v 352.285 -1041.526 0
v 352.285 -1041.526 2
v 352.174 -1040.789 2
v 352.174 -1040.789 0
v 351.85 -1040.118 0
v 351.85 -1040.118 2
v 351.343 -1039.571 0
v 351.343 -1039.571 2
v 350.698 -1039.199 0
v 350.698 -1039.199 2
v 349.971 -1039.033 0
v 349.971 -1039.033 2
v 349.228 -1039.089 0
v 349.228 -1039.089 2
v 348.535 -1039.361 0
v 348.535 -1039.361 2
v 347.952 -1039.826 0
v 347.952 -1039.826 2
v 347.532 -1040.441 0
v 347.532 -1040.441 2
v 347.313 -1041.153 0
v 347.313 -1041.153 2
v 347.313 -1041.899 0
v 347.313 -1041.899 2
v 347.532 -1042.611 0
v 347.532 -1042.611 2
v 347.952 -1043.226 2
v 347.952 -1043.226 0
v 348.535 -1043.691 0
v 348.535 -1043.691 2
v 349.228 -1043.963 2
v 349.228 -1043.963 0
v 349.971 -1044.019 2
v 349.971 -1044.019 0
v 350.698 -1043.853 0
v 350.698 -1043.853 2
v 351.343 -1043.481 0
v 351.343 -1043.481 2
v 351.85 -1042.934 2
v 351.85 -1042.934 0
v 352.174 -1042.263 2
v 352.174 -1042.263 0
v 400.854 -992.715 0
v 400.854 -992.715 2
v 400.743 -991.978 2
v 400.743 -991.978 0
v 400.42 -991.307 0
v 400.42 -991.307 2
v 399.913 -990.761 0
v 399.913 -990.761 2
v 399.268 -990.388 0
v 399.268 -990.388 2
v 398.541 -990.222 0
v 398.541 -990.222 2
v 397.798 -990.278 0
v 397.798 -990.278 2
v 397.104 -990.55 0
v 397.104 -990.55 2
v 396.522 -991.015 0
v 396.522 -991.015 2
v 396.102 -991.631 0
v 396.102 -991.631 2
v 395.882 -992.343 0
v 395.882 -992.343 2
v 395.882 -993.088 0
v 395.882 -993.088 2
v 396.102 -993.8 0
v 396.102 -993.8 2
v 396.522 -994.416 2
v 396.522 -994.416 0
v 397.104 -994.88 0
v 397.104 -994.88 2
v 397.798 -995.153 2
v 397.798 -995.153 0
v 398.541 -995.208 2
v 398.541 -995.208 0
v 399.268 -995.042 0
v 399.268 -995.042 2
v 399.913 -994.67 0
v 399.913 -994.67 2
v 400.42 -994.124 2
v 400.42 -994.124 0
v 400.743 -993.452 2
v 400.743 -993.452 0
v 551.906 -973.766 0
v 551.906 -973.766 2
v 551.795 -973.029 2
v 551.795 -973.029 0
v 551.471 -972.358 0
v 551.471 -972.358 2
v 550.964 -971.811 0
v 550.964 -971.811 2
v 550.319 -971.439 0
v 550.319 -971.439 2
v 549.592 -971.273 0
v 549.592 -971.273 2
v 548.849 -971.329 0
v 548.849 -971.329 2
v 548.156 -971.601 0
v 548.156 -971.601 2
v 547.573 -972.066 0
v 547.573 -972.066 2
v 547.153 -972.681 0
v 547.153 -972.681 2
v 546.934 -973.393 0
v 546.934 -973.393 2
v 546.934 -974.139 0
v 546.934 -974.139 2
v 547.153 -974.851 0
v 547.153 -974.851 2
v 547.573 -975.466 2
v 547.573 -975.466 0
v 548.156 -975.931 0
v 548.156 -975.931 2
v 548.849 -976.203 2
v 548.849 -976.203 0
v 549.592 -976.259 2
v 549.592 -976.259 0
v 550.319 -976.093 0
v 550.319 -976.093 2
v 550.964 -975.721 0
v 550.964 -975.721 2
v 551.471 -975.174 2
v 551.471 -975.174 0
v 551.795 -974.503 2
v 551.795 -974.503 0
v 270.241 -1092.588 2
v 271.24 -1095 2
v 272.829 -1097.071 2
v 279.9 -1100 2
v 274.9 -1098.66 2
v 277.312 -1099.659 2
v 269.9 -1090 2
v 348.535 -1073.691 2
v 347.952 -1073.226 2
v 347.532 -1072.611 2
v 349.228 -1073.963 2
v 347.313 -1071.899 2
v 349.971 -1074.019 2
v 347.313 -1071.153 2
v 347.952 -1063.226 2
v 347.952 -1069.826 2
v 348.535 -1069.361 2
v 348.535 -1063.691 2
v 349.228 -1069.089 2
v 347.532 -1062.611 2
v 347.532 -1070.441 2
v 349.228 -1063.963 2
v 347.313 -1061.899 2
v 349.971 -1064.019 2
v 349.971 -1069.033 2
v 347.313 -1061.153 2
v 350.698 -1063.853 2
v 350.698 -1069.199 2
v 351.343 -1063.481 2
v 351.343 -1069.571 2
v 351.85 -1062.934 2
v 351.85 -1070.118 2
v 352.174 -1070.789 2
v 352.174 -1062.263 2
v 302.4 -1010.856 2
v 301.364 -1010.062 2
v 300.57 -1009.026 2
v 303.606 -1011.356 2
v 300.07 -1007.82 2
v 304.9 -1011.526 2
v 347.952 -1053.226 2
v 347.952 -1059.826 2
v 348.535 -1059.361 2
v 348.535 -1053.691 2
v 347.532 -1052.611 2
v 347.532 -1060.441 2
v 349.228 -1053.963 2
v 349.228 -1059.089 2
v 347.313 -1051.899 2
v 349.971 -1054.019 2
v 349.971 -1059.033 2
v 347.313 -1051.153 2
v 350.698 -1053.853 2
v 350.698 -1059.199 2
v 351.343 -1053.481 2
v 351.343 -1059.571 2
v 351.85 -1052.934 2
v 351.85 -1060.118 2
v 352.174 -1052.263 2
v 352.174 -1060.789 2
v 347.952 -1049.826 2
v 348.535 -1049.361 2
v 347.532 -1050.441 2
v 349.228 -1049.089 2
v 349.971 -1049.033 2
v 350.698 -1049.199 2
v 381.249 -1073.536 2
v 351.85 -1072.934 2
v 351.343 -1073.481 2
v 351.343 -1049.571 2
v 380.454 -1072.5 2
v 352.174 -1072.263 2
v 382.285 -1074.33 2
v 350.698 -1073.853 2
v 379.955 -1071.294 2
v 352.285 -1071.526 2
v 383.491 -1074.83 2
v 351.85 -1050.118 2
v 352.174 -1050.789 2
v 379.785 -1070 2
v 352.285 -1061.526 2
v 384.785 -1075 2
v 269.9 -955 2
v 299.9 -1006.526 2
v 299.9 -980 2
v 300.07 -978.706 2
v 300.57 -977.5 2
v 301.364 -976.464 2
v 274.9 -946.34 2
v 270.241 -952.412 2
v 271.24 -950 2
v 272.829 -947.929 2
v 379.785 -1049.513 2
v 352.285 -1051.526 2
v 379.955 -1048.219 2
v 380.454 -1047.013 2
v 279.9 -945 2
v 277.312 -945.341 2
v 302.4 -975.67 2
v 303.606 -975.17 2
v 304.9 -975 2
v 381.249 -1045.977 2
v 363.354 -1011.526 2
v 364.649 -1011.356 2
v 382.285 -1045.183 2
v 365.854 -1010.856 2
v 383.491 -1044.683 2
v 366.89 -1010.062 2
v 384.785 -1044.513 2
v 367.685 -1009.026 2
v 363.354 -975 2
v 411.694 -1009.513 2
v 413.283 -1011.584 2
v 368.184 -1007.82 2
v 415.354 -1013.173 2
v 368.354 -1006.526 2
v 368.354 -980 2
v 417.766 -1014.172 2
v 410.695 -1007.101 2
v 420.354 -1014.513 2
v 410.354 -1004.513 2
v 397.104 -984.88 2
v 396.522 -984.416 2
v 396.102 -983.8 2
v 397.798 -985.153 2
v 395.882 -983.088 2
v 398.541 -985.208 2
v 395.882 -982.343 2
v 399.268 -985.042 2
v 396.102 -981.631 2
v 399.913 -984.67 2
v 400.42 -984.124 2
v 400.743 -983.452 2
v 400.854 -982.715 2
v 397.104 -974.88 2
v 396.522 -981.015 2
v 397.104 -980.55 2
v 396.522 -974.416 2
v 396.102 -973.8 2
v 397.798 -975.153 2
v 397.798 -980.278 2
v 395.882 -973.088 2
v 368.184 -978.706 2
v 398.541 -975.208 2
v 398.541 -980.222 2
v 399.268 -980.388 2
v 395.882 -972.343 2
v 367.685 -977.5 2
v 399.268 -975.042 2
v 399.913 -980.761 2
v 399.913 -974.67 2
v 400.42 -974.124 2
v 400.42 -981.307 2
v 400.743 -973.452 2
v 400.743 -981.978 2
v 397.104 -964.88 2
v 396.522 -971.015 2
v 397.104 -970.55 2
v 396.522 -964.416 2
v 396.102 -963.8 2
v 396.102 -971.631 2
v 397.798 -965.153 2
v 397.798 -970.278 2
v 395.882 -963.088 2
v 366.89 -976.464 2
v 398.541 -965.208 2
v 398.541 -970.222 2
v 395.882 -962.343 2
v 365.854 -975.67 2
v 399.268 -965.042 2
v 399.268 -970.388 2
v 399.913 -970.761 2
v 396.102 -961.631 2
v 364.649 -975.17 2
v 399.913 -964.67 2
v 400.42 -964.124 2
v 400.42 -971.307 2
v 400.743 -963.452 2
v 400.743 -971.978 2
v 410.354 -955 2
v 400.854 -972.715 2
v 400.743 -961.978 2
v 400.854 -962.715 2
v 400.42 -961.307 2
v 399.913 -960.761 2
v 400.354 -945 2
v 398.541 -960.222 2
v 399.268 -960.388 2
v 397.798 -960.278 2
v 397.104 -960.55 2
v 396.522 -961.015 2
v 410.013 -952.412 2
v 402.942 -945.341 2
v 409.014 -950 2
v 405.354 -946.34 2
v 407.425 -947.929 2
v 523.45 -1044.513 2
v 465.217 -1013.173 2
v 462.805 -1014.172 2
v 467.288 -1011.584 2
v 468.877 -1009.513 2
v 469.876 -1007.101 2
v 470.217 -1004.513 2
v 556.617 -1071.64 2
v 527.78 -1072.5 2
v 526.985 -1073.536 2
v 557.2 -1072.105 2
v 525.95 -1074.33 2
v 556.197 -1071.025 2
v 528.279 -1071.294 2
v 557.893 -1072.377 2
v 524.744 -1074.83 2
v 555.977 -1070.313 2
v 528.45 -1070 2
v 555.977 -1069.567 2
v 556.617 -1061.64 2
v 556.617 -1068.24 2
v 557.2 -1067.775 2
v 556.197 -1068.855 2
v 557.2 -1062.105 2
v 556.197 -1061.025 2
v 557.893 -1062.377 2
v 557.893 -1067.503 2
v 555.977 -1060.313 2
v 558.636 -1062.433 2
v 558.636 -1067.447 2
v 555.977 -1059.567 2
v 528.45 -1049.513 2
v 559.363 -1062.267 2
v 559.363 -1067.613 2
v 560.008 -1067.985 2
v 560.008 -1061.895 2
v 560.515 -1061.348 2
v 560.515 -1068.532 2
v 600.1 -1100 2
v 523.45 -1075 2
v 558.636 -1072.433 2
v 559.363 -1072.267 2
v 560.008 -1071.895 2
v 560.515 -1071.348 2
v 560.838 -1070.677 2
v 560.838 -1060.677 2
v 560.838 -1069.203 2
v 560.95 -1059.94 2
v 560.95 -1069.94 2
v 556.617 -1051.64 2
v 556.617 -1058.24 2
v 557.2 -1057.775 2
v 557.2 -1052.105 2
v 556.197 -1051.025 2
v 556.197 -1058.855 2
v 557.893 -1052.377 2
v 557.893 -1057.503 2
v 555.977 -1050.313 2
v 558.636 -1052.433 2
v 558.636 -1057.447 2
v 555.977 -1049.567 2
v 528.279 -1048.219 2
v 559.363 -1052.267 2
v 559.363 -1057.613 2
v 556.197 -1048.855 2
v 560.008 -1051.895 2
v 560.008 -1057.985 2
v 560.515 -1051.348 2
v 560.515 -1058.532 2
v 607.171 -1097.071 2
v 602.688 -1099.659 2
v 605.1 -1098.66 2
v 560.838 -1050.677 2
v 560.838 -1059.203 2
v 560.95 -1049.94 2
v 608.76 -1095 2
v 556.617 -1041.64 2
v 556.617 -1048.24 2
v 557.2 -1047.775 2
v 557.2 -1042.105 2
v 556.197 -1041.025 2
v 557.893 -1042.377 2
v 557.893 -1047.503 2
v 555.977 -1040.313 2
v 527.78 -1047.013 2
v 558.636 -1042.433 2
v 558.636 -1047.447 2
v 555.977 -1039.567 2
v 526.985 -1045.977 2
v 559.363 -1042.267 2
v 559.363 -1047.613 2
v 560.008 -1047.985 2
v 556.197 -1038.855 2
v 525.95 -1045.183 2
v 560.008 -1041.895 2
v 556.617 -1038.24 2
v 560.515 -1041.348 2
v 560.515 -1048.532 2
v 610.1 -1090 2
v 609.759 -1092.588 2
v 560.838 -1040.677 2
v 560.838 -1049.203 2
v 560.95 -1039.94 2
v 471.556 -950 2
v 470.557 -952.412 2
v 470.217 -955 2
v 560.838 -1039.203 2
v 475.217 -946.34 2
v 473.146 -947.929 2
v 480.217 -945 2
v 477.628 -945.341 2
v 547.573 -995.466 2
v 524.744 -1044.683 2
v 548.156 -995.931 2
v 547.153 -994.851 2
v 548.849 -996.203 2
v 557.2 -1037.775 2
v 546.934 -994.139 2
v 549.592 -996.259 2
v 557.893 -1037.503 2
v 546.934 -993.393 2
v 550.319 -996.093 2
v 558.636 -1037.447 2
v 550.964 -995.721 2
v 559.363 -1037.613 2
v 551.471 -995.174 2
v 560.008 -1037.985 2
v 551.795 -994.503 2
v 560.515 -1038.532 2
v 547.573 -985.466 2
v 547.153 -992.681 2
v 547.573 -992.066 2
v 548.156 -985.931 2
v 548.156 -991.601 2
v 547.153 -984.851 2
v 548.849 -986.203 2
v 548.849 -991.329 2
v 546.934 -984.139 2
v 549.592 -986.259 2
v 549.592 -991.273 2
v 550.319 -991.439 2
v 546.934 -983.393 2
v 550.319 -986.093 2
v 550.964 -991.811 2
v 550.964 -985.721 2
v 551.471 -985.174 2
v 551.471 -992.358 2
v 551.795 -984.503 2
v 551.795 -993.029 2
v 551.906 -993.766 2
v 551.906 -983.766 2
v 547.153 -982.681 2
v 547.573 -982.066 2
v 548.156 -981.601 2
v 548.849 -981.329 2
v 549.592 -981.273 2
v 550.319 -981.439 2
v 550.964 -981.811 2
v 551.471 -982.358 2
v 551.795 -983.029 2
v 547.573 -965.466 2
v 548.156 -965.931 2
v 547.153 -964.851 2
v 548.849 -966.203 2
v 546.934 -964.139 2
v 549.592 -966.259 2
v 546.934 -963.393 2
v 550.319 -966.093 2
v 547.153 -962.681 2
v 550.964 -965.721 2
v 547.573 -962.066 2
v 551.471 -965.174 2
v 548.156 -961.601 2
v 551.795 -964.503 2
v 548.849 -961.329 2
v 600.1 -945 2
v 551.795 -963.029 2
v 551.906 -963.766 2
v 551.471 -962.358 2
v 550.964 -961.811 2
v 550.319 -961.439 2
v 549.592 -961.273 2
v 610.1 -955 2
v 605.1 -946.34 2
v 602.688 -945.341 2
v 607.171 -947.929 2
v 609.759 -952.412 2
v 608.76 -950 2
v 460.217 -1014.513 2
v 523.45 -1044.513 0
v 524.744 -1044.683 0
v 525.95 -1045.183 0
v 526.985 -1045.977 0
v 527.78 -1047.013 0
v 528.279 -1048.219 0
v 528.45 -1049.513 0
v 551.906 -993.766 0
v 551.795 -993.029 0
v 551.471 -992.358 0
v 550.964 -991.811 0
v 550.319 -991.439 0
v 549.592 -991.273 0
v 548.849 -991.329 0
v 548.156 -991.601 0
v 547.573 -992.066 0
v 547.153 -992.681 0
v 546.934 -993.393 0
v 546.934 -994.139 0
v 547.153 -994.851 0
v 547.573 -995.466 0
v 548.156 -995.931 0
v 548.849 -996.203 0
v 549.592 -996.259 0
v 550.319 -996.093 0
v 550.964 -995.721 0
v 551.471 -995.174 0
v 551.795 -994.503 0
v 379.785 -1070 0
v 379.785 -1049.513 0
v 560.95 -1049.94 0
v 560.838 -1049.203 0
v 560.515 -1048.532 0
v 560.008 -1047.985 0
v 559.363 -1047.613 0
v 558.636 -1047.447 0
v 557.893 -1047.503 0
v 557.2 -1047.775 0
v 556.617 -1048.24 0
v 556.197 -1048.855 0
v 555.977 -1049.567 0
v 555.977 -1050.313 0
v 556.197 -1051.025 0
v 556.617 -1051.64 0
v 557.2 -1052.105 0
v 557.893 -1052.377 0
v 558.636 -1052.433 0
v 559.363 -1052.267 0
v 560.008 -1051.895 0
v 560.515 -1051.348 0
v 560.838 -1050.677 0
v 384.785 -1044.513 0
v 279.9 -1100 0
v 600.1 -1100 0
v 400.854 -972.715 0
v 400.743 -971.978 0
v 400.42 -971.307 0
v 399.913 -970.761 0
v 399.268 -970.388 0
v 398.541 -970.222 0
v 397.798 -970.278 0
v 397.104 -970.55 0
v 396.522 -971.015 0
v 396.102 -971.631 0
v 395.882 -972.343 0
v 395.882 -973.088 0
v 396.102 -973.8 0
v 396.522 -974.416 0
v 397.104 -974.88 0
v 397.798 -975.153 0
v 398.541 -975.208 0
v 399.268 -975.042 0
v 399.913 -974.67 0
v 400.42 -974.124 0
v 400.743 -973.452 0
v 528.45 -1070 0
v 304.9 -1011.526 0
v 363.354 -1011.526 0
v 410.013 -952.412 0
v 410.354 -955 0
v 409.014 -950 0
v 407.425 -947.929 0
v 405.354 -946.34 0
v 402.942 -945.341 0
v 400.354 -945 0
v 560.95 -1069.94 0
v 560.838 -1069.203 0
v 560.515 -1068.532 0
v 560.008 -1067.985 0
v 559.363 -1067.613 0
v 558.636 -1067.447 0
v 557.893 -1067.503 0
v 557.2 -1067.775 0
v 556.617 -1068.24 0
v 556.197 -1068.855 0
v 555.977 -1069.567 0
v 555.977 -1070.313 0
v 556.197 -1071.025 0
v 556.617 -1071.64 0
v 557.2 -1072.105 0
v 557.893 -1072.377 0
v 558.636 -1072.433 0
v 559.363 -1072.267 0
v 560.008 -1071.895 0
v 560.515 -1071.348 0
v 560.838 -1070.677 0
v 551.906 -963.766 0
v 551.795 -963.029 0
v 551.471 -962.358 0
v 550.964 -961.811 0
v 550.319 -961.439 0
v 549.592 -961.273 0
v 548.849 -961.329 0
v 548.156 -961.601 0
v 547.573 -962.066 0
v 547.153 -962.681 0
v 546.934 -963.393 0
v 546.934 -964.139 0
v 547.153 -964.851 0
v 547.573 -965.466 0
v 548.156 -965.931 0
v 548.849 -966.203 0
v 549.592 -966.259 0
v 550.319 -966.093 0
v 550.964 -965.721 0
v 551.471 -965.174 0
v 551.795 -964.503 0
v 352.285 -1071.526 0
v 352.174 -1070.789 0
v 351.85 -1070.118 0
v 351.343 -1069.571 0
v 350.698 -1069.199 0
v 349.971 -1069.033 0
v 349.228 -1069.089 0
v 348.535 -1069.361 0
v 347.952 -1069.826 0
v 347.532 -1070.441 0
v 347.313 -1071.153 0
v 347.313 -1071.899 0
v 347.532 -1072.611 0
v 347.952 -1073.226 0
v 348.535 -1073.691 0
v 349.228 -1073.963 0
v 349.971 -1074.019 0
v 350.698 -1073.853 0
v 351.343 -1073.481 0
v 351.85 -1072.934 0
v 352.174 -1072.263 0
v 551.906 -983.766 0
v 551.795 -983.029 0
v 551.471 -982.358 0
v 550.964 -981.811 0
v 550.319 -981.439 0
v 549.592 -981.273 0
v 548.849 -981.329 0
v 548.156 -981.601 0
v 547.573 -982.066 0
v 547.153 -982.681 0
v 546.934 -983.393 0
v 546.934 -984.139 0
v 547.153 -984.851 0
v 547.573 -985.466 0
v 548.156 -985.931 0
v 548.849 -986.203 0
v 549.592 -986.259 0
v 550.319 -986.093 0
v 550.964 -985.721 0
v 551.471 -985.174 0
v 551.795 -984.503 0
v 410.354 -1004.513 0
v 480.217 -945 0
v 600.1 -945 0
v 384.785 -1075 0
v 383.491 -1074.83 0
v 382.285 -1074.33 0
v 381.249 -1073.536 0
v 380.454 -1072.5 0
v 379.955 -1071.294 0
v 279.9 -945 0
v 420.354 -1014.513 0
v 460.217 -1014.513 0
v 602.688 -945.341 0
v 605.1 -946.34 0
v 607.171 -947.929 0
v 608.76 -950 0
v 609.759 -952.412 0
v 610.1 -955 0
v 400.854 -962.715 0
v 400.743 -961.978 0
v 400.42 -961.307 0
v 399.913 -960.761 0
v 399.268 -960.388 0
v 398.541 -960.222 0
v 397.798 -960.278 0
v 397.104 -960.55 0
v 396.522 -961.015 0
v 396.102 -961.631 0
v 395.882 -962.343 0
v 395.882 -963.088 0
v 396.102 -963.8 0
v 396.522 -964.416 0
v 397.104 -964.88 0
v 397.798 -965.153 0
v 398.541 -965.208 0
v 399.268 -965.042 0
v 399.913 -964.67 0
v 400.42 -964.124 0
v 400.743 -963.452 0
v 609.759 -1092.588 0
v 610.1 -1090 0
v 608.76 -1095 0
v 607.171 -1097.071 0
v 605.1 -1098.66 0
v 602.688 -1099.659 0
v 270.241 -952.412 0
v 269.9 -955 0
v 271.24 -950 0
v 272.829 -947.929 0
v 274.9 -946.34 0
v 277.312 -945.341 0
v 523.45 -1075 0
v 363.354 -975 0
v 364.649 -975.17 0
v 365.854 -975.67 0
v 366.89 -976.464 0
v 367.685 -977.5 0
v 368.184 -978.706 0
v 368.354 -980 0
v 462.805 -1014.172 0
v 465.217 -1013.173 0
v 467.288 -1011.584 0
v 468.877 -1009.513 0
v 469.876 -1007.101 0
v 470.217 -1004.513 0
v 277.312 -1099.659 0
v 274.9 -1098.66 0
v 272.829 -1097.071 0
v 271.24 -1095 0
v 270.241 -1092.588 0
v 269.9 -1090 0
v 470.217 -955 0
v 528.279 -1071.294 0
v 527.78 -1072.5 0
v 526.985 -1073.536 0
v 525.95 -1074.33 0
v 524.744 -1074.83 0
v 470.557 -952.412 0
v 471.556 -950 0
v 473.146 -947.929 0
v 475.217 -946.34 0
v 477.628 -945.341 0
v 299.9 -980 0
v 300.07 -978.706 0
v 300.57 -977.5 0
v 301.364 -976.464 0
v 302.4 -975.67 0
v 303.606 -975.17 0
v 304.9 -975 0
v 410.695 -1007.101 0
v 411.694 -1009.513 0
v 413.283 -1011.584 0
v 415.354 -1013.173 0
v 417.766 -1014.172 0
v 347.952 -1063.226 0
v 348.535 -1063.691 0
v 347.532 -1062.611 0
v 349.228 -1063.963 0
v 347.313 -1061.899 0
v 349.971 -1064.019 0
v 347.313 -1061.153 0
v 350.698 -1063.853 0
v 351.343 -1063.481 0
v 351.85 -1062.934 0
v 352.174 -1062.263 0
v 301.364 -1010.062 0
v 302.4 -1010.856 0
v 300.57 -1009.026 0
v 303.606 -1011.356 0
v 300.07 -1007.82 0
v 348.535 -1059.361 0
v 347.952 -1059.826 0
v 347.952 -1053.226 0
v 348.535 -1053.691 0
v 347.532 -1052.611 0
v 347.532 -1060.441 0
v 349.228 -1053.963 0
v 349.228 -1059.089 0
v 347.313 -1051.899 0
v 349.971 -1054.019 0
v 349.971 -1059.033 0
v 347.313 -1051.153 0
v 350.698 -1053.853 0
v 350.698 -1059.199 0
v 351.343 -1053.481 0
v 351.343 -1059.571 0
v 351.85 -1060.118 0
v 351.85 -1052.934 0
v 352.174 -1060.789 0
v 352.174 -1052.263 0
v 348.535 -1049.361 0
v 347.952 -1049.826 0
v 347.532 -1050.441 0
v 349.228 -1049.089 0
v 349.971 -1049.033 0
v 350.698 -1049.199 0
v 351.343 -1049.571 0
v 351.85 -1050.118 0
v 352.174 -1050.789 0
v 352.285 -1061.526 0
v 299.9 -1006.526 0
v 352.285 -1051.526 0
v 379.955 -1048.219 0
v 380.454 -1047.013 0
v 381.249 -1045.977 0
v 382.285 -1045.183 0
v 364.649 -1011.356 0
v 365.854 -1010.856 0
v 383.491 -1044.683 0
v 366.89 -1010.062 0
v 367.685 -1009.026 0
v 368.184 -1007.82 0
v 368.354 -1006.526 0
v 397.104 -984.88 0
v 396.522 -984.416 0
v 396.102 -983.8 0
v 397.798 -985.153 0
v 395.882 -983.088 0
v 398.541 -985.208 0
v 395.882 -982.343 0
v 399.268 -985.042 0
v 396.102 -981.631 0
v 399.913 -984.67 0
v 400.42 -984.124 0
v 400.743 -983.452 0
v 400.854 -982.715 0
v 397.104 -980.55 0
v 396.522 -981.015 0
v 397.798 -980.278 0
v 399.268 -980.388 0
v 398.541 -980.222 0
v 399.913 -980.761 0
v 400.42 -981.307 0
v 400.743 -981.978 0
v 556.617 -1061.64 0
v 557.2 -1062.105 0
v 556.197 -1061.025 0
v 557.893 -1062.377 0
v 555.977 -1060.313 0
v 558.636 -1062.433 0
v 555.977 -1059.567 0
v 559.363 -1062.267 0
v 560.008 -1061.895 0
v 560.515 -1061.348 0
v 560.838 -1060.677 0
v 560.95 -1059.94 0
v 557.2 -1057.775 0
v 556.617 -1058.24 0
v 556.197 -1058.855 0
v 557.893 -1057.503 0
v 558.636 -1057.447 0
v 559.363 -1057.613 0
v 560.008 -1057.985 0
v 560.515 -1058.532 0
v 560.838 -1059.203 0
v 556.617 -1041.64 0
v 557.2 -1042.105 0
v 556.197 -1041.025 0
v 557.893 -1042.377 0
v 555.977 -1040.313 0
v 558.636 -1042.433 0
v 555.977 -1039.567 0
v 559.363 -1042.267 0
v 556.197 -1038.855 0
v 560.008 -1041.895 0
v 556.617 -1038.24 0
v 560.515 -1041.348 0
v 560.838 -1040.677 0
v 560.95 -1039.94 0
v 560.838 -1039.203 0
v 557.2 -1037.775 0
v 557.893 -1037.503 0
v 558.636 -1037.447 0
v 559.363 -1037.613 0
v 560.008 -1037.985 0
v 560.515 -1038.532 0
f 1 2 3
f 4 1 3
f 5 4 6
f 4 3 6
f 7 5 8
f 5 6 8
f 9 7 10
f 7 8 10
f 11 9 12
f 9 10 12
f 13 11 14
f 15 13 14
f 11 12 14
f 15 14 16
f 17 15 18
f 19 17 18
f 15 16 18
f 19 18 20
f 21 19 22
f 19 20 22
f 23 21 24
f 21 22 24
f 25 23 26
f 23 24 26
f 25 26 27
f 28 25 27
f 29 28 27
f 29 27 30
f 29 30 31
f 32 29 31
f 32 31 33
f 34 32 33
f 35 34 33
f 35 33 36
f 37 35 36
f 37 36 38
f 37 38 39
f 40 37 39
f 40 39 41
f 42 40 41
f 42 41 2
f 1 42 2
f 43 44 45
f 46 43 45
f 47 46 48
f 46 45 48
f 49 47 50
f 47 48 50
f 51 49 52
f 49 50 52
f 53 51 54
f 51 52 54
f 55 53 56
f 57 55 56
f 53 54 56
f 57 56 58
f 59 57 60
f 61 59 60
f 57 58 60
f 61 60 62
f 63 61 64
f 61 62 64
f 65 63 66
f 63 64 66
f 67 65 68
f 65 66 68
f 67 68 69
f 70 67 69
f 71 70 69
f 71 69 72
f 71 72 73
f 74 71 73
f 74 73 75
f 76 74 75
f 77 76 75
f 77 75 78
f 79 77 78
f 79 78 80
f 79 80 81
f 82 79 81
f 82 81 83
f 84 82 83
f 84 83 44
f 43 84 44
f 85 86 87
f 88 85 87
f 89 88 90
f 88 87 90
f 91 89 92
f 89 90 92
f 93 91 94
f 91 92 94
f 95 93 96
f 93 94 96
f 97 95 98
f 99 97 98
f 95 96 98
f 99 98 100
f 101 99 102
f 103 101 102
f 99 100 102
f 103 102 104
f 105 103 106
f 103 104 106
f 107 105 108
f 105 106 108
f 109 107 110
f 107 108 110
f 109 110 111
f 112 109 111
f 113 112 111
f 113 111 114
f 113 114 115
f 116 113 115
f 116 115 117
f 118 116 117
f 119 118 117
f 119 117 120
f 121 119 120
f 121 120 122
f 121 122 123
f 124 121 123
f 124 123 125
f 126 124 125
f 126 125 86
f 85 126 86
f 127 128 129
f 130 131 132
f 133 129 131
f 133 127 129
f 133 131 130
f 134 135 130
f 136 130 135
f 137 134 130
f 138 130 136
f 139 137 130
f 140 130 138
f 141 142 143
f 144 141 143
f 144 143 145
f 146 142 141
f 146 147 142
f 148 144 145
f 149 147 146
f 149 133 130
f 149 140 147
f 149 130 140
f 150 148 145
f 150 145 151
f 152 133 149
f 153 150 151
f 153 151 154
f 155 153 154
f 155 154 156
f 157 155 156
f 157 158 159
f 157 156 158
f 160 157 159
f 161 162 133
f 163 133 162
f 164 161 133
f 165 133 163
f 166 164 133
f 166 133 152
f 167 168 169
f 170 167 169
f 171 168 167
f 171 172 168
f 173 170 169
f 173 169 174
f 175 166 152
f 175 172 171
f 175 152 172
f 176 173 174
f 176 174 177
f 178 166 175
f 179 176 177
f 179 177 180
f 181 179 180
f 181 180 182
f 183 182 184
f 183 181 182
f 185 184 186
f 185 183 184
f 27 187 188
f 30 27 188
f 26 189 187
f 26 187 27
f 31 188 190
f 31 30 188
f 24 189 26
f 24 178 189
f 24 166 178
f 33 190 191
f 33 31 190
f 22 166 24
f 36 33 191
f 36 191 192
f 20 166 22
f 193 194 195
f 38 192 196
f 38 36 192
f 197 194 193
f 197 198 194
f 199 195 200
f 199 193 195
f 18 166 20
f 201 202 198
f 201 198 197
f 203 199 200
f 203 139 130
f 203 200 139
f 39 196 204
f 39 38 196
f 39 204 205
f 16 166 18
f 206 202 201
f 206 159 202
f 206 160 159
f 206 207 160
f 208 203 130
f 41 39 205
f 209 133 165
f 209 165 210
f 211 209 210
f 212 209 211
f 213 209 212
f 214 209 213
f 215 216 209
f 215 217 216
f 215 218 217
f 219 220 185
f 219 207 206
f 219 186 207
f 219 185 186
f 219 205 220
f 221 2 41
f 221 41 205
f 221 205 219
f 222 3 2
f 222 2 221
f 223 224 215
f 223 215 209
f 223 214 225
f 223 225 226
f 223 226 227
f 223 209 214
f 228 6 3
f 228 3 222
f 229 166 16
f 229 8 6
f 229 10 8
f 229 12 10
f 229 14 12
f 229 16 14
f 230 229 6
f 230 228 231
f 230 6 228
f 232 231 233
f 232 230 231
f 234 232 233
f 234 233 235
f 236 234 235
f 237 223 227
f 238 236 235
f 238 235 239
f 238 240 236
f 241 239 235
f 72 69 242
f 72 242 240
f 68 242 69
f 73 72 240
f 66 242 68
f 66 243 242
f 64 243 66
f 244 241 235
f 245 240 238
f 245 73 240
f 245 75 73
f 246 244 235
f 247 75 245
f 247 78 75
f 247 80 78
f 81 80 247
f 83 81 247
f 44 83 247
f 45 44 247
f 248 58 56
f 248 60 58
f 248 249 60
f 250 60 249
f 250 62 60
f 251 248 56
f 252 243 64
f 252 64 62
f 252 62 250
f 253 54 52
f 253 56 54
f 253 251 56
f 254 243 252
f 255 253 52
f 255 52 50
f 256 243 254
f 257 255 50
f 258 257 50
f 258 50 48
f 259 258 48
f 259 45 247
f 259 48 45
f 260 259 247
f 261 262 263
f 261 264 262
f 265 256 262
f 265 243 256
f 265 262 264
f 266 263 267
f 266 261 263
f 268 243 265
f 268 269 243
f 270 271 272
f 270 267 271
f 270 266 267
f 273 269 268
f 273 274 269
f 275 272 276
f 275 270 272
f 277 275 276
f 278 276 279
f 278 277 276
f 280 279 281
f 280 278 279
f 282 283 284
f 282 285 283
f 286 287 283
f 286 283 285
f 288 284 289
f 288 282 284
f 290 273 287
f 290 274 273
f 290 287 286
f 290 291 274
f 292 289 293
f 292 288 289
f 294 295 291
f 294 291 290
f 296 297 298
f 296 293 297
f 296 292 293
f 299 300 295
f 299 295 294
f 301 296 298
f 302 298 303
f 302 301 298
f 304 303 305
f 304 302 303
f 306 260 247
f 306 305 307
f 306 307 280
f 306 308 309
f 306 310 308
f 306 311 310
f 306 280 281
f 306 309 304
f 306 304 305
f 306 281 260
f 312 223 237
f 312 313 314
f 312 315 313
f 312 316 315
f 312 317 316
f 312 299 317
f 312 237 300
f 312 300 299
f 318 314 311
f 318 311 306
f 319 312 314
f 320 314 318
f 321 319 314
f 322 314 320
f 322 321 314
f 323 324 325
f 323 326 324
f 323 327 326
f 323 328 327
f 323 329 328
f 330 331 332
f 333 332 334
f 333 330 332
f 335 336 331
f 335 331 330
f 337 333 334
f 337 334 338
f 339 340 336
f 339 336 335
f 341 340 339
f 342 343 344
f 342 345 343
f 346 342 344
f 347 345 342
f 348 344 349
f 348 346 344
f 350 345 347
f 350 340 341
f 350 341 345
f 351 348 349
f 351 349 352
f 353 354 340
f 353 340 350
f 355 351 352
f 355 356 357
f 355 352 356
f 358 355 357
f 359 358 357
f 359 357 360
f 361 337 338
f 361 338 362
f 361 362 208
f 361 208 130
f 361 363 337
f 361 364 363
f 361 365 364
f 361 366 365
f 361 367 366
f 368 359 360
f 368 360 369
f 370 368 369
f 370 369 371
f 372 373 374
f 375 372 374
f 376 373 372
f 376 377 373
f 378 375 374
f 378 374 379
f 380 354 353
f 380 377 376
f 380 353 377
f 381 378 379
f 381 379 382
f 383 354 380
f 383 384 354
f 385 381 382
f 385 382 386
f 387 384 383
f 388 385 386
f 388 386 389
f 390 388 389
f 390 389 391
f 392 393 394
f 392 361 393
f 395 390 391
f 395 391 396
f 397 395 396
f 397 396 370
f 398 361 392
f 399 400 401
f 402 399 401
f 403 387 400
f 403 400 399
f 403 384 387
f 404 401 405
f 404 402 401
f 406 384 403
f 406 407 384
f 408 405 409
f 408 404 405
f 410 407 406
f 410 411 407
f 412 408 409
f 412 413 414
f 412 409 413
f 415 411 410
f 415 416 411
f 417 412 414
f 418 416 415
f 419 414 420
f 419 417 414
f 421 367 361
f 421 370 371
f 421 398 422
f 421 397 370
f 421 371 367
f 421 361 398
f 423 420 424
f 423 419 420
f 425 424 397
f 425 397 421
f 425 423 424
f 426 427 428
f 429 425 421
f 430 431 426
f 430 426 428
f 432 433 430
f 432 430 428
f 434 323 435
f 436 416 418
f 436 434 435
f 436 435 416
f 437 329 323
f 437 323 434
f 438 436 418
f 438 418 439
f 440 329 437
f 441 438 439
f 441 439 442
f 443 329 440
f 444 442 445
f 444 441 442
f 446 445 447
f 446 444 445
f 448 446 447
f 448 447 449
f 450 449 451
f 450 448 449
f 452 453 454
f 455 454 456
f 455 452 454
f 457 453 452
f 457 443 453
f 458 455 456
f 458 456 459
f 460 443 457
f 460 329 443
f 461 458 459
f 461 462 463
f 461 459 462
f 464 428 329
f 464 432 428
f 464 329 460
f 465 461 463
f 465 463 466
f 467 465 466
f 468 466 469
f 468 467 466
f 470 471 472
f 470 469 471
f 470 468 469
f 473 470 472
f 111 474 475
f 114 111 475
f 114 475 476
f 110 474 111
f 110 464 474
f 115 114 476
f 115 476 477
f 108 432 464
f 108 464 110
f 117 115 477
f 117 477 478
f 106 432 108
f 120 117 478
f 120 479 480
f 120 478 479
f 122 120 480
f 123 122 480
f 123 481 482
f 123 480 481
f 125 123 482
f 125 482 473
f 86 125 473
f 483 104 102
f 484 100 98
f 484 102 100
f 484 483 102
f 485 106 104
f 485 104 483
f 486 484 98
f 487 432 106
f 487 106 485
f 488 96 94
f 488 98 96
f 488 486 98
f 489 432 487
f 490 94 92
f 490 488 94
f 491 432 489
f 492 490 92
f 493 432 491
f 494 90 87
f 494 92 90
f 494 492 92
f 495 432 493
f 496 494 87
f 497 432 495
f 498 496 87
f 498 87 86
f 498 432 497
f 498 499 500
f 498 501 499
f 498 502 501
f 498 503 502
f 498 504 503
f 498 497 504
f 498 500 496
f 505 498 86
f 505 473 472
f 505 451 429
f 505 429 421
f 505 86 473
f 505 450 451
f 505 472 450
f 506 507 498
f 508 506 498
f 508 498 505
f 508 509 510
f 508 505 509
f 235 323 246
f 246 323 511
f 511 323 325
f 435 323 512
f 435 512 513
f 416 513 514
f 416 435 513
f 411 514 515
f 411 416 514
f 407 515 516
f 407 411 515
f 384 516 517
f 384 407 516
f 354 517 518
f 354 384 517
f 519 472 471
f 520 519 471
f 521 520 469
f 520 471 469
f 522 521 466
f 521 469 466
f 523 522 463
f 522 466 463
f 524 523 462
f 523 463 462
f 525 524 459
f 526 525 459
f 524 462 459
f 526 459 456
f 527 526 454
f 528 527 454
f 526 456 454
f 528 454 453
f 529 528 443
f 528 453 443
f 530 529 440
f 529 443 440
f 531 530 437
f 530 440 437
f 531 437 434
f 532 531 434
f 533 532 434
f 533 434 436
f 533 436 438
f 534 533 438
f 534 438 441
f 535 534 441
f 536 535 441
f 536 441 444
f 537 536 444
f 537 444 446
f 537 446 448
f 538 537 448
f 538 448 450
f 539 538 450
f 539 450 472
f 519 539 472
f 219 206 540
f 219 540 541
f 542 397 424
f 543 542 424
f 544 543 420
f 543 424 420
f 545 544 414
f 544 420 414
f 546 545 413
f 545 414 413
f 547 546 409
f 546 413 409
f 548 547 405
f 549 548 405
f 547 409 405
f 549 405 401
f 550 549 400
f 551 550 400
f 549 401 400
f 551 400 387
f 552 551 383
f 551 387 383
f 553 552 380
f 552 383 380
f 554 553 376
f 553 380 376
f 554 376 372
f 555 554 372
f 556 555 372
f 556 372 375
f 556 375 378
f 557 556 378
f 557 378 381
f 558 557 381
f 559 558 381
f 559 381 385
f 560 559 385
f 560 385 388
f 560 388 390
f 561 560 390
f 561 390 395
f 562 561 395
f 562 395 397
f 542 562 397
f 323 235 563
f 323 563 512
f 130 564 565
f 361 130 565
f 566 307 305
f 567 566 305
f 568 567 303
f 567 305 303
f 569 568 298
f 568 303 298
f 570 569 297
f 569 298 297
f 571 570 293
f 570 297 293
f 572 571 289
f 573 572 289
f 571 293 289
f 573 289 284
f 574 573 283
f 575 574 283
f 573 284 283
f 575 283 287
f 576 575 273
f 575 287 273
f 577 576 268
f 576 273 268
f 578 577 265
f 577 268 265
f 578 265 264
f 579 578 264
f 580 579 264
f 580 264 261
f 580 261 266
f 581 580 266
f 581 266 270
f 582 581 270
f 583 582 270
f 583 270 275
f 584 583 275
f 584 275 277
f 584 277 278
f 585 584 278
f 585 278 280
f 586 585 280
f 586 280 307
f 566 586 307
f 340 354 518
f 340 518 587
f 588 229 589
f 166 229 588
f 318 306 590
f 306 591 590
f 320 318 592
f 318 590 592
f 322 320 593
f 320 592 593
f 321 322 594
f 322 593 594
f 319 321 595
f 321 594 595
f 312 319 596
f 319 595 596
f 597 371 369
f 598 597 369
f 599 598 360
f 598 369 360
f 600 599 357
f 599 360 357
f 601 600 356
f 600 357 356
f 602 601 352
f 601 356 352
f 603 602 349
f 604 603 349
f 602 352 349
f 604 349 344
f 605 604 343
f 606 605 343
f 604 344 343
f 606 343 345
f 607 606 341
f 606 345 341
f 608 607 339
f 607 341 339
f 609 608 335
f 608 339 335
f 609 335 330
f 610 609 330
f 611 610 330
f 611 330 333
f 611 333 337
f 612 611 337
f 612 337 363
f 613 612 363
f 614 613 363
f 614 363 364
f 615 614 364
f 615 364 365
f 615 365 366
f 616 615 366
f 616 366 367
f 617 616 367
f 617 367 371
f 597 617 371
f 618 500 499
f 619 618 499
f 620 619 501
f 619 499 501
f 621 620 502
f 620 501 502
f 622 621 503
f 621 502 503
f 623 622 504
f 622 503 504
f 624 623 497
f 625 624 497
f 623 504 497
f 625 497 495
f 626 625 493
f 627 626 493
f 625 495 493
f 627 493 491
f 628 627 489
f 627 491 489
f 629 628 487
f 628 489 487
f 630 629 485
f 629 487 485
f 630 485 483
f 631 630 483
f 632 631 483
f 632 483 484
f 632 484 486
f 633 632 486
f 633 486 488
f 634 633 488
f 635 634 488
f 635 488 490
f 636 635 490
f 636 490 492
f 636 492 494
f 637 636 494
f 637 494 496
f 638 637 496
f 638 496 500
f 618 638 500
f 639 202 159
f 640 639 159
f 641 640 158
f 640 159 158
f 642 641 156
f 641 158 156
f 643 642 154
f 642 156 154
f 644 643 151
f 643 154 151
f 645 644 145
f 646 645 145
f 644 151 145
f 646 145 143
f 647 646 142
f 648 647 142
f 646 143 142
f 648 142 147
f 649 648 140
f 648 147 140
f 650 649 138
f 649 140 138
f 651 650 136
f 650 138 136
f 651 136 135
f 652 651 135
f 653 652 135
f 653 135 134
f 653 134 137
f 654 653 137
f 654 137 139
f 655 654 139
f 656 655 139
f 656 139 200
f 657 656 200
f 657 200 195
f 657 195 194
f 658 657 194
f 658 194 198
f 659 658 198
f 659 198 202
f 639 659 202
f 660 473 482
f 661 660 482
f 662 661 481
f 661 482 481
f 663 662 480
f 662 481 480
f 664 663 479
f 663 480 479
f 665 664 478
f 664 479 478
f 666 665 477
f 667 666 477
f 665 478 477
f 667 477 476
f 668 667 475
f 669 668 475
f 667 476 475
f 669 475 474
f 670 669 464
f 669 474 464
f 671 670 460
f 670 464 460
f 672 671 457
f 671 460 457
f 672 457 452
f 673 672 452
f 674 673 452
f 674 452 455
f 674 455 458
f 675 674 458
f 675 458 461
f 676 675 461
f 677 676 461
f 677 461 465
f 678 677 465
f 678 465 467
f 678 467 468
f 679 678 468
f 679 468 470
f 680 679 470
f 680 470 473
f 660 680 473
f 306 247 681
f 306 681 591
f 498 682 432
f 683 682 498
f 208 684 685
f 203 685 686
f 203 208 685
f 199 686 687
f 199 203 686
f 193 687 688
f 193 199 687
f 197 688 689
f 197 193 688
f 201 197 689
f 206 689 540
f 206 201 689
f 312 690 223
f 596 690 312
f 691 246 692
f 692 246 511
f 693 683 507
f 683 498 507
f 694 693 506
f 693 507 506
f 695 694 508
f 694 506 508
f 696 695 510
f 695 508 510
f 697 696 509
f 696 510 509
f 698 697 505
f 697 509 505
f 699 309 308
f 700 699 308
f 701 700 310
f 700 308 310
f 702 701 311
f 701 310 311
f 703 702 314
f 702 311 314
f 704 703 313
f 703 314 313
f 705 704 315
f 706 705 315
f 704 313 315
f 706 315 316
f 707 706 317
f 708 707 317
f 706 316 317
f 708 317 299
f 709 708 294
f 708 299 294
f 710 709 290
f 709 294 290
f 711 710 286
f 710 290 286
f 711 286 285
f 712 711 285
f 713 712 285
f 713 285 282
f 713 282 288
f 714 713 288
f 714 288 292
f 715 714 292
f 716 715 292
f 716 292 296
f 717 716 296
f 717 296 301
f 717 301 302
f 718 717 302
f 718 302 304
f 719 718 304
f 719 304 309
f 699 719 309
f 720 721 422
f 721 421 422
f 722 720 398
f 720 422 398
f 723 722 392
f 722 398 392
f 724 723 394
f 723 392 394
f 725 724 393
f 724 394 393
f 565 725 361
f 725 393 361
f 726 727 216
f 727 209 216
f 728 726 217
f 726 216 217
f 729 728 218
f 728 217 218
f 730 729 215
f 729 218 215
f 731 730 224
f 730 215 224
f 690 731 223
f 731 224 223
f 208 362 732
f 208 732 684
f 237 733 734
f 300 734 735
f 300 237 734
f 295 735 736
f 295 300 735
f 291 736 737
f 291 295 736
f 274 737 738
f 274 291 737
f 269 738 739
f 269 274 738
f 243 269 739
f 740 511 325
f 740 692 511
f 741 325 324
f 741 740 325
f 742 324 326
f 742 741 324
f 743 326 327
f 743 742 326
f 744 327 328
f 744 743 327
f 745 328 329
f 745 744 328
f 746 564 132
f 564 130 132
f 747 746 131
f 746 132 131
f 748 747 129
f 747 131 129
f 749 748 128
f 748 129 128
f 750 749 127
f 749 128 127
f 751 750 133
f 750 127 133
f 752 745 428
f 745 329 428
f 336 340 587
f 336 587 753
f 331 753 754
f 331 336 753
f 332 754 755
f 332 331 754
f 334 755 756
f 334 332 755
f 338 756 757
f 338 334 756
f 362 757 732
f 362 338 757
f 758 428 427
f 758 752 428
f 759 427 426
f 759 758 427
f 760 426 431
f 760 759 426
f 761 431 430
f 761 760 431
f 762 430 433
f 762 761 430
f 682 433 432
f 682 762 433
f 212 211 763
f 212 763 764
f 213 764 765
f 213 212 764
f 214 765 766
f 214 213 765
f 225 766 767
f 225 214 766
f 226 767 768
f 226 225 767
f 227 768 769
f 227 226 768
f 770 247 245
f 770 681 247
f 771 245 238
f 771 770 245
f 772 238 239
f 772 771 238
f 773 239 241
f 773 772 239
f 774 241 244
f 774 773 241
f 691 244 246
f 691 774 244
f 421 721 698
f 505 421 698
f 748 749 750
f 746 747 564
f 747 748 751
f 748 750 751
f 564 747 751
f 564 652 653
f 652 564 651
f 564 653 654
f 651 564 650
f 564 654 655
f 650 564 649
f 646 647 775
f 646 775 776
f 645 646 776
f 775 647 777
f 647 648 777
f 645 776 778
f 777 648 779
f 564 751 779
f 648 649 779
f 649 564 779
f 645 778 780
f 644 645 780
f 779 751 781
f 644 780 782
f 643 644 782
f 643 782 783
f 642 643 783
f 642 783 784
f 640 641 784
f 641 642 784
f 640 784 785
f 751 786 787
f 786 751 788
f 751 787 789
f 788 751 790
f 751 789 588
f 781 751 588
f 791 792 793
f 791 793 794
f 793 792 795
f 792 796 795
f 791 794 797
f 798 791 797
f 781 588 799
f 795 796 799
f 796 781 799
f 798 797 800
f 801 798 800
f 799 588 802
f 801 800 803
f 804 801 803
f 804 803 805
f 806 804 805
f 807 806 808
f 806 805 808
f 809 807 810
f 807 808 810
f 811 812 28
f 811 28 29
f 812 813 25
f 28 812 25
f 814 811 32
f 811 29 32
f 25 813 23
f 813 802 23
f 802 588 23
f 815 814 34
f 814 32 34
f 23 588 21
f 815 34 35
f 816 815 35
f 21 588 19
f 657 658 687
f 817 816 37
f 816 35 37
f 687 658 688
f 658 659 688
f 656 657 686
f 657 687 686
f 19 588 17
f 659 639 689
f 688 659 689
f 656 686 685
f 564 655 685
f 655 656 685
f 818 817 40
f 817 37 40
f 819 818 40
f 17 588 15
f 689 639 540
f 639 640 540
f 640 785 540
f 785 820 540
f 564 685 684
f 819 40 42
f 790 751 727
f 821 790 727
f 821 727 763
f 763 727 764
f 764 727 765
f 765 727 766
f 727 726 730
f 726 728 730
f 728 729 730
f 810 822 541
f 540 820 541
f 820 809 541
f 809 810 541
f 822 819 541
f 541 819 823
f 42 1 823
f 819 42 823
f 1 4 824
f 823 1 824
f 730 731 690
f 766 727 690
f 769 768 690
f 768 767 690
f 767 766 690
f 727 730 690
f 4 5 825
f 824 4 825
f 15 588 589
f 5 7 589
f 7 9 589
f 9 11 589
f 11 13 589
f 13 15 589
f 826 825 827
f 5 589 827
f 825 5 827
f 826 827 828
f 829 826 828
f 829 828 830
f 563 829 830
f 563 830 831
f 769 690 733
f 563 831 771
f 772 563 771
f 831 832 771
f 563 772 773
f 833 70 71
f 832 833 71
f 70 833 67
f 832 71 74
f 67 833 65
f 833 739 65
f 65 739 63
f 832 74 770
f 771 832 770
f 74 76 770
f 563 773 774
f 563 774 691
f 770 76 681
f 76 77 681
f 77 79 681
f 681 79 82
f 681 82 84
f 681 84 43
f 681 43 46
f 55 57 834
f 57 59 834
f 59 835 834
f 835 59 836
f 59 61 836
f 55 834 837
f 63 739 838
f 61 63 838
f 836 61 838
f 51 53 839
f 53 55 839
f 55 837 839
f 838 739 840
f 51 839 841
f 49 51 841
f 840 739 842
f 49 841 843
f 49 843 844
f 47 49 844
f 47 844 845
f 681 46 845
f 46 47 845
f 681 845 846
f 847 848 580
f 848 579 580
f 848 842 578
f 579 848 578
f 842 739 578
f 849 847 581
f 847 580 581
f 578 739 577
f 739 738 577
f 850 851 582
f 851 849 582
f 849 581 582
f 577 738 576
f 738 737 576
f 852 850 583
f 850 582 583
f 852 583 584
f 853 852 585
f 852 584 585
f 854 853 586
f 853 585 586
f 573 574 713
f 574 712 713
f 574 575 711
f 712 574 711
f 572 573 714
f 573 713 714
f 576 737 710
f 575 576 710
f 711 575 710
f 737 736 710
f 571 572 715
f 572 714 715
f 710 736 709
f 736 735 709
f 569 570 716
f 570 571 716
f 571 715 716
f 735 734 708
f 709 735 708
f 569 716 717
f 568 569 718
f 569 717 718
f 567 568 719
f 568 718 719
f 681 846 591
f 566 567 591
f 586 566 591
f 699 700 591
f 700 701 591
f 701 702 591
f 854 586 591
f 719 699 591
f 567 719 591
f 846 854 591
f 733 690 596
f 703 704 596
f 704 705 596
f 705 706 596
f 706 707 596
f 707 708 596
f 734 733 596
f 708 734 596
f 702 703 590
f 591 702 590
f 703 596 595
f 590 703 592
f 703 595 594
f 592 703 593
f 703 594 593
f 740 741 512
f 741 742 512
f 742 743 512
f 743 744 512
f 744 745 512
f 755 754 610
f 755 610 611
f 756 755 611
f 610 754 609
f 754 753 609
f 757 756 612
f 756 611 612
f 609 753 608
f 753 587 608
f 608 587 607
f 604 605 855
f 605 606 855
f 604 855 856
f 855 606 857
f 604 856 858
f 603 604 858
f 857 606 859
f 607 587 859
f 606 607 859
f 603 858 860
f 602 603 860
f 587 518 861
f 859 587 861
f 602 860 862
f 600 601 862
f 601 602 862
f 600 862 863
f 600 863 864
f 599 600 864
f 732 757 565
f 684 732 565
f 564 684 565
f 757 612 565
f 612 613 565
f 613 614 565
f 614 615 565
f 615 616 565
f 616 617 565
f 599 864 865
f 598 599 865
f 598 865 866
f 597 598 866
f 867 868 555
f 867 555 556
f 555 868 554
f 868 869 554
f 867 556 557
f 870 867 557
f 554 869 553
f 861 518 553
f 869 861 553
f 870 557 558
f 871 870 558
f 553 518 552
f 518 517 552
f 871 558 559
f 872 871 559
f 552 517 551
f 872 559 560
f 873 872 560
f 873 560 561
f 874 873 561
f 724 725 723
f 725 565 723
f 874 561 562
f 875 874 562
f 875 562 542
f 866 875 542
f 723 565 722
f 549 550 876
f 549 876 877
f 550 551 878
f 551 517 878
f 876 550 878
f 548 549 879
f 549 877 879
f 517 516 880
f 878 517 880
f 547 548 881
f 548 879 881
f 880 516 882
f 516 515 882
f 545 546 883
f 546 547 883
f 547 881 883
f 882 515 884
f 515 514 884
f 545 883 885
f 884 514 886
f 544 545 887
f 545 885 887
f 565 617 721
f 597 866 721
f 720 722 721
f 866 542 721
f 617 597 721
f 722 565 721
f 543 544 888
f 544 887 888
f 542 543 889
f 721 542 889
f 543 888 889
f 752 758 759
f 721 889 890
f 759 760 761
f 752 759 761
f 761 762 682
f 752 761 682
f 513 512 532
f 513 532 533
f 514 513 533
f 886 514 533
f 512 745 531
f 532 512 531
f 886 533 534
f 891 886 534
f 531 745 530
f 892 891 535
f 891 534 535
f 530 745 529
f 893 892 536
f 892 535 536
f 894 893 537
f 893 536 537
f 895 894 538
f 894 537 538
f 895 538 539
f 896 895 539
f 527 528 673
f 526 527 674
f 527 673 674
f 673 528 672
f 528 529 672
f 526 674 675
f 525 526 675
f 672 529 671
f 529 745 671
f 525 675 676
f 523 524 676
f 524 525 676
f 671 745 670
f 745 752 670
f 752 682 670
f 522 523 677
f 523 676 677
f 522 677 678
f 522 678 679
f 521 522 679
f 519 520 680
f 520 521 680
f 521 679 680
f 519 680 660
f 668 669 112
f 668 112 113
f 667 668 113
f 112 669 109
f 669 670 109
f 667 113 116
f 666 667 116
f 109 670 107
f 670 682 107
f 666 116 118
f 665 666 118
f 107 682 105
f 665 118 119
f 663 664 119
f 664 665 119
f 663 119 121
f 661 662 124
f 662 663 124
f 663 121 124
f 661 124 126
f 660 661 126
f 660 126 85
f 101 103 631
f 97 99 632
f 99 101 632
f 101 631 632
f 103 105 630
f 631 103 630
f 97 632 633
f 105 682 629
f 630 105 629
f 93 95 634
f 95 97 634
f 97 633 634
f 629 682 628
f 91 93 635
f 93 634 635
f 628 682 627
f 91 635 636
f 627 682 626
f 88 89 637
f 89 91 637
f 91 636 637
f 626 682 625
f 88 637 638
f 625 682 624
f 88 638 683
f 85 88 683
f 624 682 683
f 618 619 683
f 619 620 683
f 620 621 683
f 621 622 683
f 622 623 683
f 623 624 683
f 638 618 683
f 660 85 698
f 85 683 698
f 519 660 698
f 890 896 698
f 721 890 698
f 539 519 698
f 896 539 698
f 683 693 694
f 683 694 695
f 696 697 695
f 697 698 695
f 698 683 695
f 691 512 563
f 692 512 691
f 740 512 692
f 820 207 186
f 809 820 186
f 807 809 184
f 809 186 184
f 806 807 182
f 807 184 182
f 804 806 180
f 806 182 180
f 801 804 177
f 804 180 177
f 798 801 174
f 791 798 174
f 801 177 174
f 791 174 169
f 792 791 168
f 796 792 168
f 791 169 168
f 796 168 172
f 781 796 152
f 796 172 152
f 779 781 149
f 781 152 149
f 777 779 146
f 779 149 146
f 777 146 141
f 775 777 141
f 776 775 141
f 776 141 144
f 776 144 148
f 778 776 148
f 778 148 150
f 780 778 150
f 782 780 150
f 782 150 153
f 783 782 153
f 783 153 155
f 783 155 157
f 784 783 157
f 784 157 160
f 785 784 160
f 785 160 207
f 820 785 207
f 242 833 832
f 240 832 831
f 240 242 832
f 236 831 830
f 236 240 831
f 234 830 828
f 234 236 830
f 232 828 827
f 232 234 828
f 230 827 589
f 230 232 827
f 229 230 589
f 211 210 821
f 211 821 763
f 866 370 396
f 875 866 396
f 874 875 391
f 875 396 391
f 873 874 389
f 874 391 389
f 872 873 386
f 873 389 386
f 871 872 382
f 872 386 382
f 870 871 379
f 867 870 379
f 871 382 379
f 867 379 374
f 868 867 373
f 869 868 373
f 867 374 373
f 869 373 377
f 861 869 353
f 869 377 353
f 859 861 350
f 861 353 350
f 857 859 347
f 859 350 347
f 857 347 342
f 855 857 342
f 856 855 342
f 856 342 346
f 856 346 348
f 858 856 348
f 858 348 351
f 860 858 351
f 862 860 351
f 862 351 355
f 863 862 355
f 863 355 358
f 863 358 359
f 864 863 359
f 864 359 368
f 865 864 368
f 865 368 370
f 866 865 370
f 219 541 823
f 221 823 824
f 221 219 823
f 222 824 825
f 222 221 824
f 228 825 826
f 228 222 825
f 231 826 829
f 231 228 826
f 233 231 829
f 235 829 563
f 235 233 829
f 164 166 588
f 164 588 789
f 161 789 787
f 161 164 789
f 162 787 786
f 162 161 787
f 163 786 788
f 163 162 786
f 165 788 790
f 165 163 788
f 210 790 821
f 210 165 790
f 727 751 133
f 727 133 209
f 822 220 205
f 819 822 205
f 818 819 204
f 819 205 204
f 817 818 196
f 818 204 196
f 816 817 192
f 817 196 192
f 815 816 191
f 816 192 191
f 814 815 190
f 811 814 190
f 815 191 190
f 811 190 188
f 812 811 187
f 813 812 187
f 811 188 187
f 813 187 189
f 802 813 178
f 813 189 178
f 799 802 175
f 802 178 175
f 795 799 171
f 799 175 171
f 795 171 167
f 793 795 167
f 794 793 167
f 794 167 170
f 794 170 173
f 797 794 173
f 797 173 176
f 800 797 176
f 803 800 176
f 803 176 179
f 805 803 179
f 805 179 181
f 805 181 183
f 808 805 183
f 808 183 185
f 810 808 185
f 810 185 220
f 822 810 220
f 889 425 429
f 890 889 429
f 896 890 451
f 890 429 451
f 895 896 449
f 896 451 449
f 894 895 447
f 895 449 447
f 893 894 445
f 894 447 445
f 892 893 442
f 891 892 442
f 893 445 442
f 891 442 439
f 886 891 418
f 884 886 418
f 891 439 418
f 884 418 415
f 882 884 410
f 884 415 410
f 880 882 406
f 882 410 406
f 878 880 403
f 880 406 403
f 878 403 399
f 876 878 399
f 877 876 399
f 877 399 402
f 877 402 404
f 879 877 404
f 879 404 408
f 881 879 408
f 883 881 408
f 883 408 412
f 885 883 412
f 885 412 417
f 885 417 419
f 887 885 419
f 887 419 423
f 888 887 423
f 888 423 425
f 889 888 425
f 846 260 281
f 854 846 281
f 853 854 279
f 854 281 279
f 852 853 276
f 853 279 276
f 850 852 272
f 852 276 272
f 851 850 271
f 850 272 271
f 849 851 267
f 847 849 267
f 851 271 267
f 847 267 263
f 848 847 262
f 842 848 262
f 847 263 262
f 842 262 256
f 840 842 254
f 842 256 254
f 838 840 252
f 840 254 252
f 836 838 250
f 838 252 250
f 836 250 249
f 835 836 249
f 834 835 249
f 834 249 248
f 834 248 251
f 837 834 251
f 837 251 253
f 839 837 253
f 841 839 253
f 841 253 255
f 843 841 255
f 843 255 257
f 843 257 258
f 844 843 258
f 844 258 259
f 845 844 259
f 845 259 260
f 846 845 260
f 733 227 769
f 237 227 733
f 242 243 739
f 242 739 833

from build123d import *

# Parameters (mm, degrees)
SKETCH1_W           = 340.2
SKETCH1_H           = 155
BOSS_EXTRUDE1_DEPTH = 2
SKETCH2_R           = 2.5
CUT_EXTRUDE1_DEPTH  = 3
LPATTERN1_COUNT     = 4
LPATTERN1_PITCH     = 10
SKETCH3_W           = 59.862571915
SKETCH3_H           = 20.5
CUT_EXTRUDE2_DEPTH  = 3
LPATTERN2_COUNT     = 5
LPATTERN2_PITCH     = 10
SKETCH4_W           = 59.862571915
SKETCH4_H           = 9.012650354
CUT_EXTRUDE3_DEPTH  = 3
FILLET1_R           = 10
FILLET2_R           = 10
CUT_EXTRUDE4_DEPTH  = 3


with BuildPart() as part:
    # Sketch1 → Boss-Extrude1 (new body)
    with BuildSketch(Plane.XY):
        with Locations((440, -1022.5)):
            Rectangle(SKETCH1_W, SKETCH1_H)
    extrude(amount=BOSS_EXTRUDE1_DEPTH)

    # Sketch2 → Cut-Extrude1 (cut, through all)
    with BuildSketch(Plane.XY.offset(2)):
        with Locations((558.449514061, -1039.939996933)):
            Circle(SKETCH2_R)
        with Locations((349.784616085, -1041.525975933)):
            Circle(SKETCH2_R)
        with Locations((398.354490085, -962.715267)):
            Circle(SKETCH2_R)
        with Locations((549.405587829, -963.765953)):
            Circle(SKETCH2_R)
    cut_extrude1 = extrude(amount=-CUT_EXTRUDE1_DEPTH, mode=Mode.SUBTRACT)

    # LPattern1: Cut-Extrude1 ×4
    with Locations(*[(0, -i * LPATTERN1_PITCH, 0) for i in range(1, LPATTERN1_COUNT)]):
        add(cut_extrude1, mode=Mode.SUBTRACT)

    # Sketch3 → Cut-Extrude2 (cut, through all)
    with BuildSketch(Plane.XY.offset(2)):
        with Locations((440.285320332, -964.262650354)):
            Rectangle(SKETCH3_W, SKETCH3_H)
    cut_extrude2 = extrude(amount=-CUT_EXTRUDE2_DEPTH, mode=Mode.SUBTRACT)

    # LPattern2: Cut-Extrude2 ×5
    with Locations(*[(0, -i * LPATTERN2_PITCH, 0) for i in range(1, LPATTERN2_COUNT)]):
        add(cut_extrude2, mode=Mode.SUBTRACT)

    # Sketch4 → Cut-Extrude3 (cut, through all)
    with BuildSketch(Plane.XY.offset(2)):
        with Locations((440.285320332, -949.506325177)):
            Rectangle(SKETCH4_W, SKETCH4_H)
    extrude(amount=-CUT_EXTRUDE3_DEPTH, mode=Mode.SUBTRACT)

    # Fillet1
    fillet1_edges = [part.edges().sort_by_distance(p)[0] for p in [
        (470.216606289, -945, 1),
        (410.354034374, -945, 1),
        (410.354034374, -1014.512650354, 1),
        (470.216606289, -1014.512650354, 1),
    ]]
    fillet(fillet1_edges, radius=FILLET1_R)

    # Fillet2
    fillet2_edges = [part.edges().sort_by_distance(p)[0] for p in [
        (610.1, -1100, 1),
        (269.9, -1100, 1),
        (269.9, -945, 1),
        (610.1, -945, 1),
    ]]
    fillet(fillet2_edges, radius=FILLET2_R)

    # Sketch5 → Cut-Extrude4 (cut, through all)
    with BuildSketch(Plane.XY.offset(2)):
        with BuildLine():
            Line((523.449514061, -1075), (384.784616085, -1075))
            ThreePointArc((384.784616085, -1075), (381.249082179, -1073.535533906), (379.784616085, -1070))
            Line((379.784616085, -1070), (379.784616085, -1049.512650354))
            ThreePointArc((379.784616085, -1049.512650354), (381.249082179, -1045.977116448), (384.784616085, -1044.512650354))
            Line((384.784616085, -1044.512650354), (523.449514061, -1044.512650354))
            ThreePointArc((523.449514061, -1044.512650354), (526.985047967, -1045.977116448), (528.449514061, -1049.512650354))
            Line((528.449514061, -1049.512650354), (528.449514061, -1070))
            ThreePointArc((528.449514061, -1070), (526.985047967, -1073.535533906), (523.449514061, -1075))
        make_face()
        with BuildLine():
            Line((363.354490085, -1011.525975933), (304.9, -1011.525975933))
            ThreePointArc((304.9, -1011.525975933), (301.364466094, -1010.061509839), (299.9, -1006.525975933))
            Line((299.9, -1006.525975933), (299.9, -980))
            ThreePointArc((299.9, -980), (301.364466094, -976.464466094), (304.9, -975))
            Line((304.9, -975), (363.354490085, -975))
            ThreePointArc((363.354490085, -975), (366.890023991, -976.464466094), (368.354490085, -980))
            Line((368.354490085, -980), (368.354490085, -1006.525975933))
            ThreePointArc((368.354490085, -1006.525975933), (366.890023991, -1010.061509839), (363.354490085, -1011.525975933))
        make_face()
    extrude(amount=-CUT_EXTRUDE4_DEPTH, mode=Mode.SUBTRACT)


solid = part.part
